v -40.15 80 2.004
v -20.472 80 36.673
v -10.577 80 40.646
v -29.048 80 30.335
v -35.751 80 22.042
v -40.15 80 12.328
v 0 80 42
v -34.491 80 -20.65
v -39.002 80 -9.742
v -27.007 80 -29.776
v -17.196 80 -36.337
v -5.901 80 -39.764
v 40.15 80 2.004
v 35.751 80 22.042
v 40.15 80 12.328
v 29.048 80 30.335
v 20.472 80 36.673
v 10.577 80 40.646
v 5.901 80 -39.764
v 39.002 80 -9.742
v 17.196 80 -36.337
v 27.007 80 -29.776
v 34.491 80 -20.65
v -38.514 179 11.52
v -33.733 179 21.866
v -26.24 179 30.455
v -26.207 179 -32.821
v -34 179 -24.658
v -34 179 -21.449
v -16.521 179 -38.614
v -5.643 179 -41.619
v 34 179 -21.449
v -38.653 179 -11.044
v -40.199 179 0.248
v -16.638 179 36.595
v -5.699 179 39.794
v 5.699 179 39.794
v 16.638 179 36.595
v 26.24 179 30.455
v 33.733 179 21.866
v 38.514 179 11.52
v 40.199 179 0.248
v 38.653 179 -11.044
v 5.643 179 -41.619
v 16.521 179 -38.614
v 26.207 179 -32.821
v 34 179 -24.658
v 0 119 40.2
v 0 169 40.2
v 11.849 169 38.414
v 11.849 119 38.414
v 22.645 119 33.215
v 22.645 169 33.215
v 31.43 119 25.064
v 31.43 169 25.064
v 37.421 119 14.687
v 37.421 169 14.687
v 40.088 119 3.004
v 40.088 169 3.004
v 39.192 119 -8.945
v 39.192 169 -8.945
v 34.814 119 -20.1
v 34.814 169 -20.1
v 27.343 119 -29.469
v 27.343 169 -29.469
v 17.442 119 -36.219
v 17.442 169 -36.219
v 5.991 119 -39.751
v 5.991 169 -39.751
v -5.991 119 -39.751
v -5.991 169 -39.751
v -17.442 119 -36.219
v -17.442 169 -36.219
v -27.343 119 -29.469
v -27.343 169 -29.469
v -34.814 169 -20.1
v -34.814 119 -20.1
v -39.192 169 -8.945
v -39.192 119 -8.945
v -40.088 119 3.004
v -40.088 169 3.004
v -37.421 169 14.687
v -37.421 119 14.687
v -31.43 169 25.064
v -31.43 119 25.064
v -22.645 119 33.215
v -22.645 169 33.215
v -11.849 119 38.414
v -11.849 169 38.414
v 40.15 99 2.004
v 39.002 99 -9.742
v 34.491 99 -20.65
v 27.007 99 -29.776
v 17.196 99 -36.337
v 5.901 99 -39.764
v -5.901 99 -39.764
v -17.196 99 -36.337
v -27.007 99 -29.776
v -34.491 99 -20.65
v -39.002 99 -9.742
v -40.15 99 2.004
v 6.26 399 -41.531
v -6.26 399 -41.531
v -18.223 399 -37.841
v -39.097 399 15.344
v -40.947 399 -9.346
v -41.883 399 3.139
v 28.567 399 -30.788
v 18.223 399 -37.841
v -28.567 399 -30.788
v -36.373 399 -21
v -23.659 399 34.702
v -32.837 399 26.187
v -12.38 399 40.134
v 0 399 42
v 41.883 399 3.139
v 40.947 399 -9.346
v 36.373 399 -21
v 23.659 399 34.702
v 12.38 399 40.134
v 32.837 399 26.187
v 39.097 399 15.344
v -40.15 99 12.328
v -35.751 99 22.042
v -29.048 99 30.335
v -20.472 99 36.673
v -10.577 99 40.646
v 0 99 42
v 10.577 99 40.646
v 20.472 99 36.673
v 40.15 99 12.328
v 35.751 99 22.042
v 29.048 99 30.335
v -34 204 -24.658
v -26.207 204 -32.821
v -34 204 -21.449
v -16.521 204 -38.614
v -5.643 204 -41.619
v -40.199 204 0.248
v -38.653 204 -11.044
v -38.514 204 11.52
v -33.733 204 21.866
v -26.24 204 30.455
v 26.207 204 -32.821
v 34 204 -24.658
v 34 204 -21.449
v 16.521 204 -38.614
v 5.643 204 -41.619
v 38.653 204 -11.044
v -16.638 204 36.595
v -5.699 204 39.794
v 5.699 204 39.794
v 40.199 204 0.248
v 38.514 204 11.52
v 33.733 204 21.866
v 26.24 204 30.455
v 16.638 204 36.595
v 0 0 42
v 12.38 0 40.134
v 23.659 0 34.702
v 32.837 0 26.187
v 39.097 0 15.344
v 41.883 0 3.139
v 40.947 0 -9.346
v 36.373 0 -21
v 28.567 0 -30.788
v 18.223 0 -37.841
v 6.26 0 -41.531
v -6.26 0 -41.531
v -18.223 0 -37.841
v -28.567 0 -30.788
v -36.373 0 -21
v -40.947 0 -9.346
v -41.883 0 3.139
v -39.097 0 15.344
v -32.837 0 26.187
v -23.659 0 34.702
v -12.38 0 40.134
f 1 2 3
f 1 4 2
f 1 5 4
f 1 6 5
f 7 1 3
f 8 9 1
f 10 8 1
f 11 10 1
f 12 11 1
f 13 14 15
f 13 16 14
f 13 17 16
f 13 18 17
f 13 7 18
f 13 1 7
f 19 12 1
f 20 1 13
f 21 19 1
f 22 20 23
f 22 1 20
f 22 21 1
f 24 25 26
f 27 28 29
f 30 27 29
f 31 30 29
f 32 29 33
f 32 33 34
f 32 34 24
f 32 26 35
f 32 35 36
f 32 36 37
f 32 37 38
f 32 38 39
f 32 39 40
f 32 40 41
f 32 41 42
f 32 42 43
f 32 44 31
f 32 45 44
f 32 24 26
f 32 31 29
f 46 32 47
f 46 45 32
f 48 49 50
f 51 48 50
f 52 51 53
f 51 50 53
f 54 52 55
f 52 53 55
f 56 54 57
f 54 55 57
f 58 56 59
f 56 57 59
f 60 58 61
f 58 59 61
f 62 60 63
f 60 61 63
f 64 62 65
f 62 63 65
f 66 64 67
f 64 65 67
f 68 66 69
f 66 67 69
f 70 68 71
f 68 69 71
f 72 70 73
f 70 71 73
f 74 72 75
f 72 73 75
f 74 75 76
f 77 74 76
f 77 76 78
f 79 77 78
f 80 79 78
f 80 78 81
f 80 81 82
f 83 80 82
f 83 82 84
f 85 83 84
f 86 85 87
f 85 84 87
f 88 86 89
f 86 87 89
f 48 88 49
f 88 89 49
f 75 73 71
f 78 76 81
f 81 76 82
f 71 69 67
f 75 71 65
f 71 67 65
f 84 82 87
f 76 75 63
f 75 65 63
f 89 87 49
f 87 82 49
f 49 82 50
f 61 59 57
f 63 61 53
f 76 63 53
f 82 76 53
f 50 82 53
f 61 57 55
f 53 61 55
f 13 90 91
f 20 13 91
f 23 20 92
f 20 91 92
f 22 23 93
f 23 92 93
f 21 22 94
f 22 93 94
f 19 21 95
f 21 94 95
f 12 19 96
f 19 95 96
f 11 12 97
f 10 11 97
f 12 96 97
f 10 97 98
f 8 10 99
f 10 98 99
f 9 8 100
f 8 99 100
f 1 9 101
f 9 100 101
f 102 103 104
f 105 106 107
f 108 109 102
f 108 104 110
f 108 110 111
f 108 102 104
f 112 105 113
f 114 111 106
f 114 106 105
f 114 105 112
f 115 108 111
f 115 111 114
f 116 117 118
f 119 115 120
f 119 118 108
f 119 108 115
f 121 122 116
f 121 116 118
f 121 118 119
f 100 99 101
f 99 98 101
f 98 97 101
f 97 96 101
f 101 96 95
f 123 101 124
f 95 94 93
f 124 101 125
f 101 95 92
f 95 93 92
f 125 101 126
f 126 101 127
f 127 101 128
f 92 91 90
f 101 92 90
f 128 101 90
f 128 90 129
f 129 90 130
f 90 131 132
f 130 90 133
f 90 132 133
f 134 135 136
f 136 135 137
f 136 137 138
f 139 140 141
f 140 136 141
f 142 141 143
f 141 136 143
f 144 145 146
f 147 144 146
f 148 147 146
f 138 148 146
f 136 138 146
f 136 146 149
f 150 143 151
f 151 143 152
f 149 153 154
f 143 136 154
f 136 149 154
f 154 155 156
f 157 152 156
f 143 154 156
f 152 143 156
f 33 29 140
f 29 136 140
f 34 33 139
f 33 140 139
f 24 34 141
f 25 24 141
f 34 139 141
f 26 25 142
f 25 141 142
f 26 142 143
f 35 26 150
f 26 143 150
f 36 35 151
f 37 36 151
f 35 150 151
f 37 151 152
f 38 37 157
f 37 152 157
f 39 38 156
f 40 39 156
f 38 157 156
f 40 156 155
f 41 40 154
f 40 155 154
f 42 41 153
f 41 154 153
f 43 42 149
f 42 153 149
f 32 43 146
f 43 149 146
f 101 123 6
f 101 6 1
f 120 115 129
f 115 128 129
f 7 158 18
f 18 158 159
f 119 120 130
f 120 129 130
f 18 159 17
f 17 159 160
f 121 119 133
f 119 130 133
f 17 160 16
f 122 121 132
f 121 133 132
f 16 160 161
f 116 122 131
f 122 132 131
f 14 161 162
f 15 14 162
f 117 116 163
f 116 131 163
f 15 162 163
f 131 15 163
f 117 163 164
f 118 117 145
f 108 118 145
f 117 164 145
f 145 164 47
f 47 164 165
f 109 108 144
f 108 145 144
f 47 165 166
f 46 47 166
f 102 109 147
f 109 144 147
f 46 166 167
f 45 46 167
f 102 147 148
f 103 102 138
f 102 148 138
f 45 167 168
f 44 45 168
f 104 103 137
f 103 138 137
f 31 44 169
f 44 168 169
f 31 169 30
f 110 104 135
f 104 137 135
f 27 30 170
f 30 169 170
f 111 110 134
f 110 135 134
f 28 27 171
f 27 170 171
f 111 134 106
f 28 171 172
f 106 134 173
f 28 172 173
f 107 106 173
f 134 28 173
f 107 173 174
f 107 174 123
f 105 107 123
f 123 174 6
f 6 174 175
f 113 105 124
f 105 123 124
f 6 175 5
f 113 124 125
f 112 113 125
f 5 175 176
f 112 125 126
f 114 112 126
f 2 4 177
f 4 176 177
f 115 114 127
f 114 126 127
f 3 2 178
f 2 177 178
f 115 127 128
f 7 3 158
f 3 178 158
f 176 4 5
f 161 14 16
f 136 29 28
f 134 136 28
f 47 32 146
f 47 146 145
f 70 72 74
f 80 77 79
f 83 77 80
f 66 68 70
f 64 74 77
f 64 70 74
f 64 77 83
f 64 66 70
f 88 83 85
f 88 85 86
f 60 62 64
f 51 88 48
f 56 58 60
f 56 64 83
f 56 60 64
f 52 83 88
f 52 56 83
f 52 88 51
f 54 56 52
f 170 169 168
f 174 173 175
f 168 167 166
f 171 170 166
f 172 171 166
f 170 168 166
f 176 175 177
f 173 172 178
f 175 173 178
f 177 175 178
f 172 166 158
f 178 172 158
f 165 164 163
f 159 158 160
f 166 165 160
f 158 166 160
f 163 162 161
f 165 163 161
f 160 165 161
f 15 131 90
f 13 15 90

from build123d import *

# Parameters (mm, degrees)
SKETCH1_R           = 42
BOSS_EXTRUDE1_DEPTH = 80
SKETCH7_R           = 42
BOSS_EXTRUDE2_DEPTH = 19
SKETCH8_R           = 40.2
BATTERY_SLOT_DEPTH  = 19
SKETCH10_W          = 80.3
SKETCH10_H          = 67
CUT_EXTRUDE6_DEPTH  = 19
SKETCH11_R          = 42
BOSS_EXTRUDE3_DEPTH = 20
SKETCH12_R          = 42
BOSS_EXTRUDE4_DEPTH = 50
SKETCH13_R          = 40.2
CUT_EXTRUDE7_DEPTH  = 50
SKETCH14_R          = 42
BOSS_EXTRUDE5_DEPTH = 35
SKETCH15_R          = 40.2
RPI_SLOT_DEPTH      = 25
SKETCH16_W          = 68
SKETCH16_H          = 64
CUT_EXTRUDE9_DEPTH  = 25
SKETCH17_R          = 42
BOSS_EXTRUDE6_DEPTH = 20
SKETCH18_R          = 42
BOSS_EXTRUDE7_DEPTH = 175


with BuildPart() as part:
    # Sketch1 → Boss-Extrude1 (new body)
    with BuildSketch(Plane(origin=(0, 0, 0), x_dir=(1, 0, 0), z_dir=(0, 1, 0))):
        Circle(SKETCH1_R)
    extrude(amount=BOSS_EXTRUDE1_DEPTH)

    # Sketch7 → Boss-Extrude2 (add)
    with BuildSketch(Plane(origin=(0, 80, 0), x_dir=(1, 0, 0), z_dir=(0, 1, 0))):
        Circle(SKETCH7_R)
    extrude(amount=BOSS_EXTRUDE2_DEPTH)

    # Sketch8 → Battery slot (cut)
    with BuildSketch(Plane(origin=(0, 99, 0), x_dir=(1, 0, 0), z_dir=(0, 1, 0))):
        Circle(SKETCH8_R)
    extrude(amount=-BATTERY_SLOT_DEPTH, mode=Mode.SUBTRACT)

    # Sketch10 → Cut-Extrude6 (cut)
    with BuildSketch(Plane(origin=(0, 99, 0), x_dir=(1, 0, 0), z_dir=(0, 1, 0))):
        with Locations((0, -31.495629775)):
            Rectangle(SKETCH10_W, SKETCH10_H)
    extrude(amount=-CUT_EXTRUDE6_DEPTH, mode=Mode.SUBTRACT)

    # Sketch11 → Boss-Extrude3 (add)
    with BuildSketch(Plane(origin=(0, 99, 0), x_dir=(1, 0, 0), z_dir=(0, 1, 0))):
        Circle(SKETCH11_R)
    extrude(amount=BOSS_EXTRUDE3_DEPTH)

    # Sketch12 → Boss-Extrude4 (add)
    with BuildSketch(Plane(origin=(0, 119, 0), x_dir=(1, 0, 0), z_dir=(0, 1, 0))):
        Circle(SKETCH12_R)
    extrude(amount=BOSS_EXTRUDE4_DEPTH)

    # Sketch13 → Cut-Extrude7 (cut)
    with BuildSketch(Plane(origin=(0, 169, 0), x_dir=(1, 0, 0), z_dir=(0, 1, 0))):
        Circle(SKETCH13_R)
    extrude(amount=-CUT_EXTRUDE7_DEPTH, mode=Mode.SUBTRACT)

    # Sketch14 → Boss-Extrude5 (add)
    with BuildSketch(Plane(origin=(0, 169, 0), x_dir=(1, 0, 0), z_dir=(0, 1, 0))):
        Circle(SKETCH14_R)
    extrude(amount=BOSS_EXTRUDE5_DEPTH)

    # Sketch15 → RPI Slot (cut)
    with BuildSketch(Plane(origin=(0, 204, 0), x_dir=(1, 0, 0), z_dir=(0, 1, 0))):
        Circle(SKETCH15_R)
    extrude(amount=-RPI_SLOT_DEPTH, mode=Mode.SUBTRACT)

    # Sketch16 → Cut-Extrude9 (cut)
    with BuildSketch(Plane(origin=(0, 204, 0), x_dir=(1, 0, 0), z_dir=(0, 1, 0))):
        with Locations((0, 18)):
            Rectangle(SKETCH16_W, SKETCH16_H)
    extrude(amount=-CUT_EXTRUDE9_DEPTH, mode=Mode.SUBTRACT)

    # Sketch17 → Boss-Extrude6 (add)
    with BuildSketch(Plane(origin=(0, 204, 0), x_dir=(1, 0, 0), z_dir=(0, 1, 0))):
        Circle(SKETCH17_R)
    extrude(amount=BOSS_EXTRUDE6_DEPTH)

    # Sketch18 → Boss-Extrude7 (add)
    with BuildSketch(Plane(origin=(0, 224, 0), x_dir=(1, 0, 0), z_dir=(0, 1, 0))):
        Circle(SKETCH18_R)
    extrude(amount=BOSS_EXTRUDE7_DEPTH)


solid = part.part
